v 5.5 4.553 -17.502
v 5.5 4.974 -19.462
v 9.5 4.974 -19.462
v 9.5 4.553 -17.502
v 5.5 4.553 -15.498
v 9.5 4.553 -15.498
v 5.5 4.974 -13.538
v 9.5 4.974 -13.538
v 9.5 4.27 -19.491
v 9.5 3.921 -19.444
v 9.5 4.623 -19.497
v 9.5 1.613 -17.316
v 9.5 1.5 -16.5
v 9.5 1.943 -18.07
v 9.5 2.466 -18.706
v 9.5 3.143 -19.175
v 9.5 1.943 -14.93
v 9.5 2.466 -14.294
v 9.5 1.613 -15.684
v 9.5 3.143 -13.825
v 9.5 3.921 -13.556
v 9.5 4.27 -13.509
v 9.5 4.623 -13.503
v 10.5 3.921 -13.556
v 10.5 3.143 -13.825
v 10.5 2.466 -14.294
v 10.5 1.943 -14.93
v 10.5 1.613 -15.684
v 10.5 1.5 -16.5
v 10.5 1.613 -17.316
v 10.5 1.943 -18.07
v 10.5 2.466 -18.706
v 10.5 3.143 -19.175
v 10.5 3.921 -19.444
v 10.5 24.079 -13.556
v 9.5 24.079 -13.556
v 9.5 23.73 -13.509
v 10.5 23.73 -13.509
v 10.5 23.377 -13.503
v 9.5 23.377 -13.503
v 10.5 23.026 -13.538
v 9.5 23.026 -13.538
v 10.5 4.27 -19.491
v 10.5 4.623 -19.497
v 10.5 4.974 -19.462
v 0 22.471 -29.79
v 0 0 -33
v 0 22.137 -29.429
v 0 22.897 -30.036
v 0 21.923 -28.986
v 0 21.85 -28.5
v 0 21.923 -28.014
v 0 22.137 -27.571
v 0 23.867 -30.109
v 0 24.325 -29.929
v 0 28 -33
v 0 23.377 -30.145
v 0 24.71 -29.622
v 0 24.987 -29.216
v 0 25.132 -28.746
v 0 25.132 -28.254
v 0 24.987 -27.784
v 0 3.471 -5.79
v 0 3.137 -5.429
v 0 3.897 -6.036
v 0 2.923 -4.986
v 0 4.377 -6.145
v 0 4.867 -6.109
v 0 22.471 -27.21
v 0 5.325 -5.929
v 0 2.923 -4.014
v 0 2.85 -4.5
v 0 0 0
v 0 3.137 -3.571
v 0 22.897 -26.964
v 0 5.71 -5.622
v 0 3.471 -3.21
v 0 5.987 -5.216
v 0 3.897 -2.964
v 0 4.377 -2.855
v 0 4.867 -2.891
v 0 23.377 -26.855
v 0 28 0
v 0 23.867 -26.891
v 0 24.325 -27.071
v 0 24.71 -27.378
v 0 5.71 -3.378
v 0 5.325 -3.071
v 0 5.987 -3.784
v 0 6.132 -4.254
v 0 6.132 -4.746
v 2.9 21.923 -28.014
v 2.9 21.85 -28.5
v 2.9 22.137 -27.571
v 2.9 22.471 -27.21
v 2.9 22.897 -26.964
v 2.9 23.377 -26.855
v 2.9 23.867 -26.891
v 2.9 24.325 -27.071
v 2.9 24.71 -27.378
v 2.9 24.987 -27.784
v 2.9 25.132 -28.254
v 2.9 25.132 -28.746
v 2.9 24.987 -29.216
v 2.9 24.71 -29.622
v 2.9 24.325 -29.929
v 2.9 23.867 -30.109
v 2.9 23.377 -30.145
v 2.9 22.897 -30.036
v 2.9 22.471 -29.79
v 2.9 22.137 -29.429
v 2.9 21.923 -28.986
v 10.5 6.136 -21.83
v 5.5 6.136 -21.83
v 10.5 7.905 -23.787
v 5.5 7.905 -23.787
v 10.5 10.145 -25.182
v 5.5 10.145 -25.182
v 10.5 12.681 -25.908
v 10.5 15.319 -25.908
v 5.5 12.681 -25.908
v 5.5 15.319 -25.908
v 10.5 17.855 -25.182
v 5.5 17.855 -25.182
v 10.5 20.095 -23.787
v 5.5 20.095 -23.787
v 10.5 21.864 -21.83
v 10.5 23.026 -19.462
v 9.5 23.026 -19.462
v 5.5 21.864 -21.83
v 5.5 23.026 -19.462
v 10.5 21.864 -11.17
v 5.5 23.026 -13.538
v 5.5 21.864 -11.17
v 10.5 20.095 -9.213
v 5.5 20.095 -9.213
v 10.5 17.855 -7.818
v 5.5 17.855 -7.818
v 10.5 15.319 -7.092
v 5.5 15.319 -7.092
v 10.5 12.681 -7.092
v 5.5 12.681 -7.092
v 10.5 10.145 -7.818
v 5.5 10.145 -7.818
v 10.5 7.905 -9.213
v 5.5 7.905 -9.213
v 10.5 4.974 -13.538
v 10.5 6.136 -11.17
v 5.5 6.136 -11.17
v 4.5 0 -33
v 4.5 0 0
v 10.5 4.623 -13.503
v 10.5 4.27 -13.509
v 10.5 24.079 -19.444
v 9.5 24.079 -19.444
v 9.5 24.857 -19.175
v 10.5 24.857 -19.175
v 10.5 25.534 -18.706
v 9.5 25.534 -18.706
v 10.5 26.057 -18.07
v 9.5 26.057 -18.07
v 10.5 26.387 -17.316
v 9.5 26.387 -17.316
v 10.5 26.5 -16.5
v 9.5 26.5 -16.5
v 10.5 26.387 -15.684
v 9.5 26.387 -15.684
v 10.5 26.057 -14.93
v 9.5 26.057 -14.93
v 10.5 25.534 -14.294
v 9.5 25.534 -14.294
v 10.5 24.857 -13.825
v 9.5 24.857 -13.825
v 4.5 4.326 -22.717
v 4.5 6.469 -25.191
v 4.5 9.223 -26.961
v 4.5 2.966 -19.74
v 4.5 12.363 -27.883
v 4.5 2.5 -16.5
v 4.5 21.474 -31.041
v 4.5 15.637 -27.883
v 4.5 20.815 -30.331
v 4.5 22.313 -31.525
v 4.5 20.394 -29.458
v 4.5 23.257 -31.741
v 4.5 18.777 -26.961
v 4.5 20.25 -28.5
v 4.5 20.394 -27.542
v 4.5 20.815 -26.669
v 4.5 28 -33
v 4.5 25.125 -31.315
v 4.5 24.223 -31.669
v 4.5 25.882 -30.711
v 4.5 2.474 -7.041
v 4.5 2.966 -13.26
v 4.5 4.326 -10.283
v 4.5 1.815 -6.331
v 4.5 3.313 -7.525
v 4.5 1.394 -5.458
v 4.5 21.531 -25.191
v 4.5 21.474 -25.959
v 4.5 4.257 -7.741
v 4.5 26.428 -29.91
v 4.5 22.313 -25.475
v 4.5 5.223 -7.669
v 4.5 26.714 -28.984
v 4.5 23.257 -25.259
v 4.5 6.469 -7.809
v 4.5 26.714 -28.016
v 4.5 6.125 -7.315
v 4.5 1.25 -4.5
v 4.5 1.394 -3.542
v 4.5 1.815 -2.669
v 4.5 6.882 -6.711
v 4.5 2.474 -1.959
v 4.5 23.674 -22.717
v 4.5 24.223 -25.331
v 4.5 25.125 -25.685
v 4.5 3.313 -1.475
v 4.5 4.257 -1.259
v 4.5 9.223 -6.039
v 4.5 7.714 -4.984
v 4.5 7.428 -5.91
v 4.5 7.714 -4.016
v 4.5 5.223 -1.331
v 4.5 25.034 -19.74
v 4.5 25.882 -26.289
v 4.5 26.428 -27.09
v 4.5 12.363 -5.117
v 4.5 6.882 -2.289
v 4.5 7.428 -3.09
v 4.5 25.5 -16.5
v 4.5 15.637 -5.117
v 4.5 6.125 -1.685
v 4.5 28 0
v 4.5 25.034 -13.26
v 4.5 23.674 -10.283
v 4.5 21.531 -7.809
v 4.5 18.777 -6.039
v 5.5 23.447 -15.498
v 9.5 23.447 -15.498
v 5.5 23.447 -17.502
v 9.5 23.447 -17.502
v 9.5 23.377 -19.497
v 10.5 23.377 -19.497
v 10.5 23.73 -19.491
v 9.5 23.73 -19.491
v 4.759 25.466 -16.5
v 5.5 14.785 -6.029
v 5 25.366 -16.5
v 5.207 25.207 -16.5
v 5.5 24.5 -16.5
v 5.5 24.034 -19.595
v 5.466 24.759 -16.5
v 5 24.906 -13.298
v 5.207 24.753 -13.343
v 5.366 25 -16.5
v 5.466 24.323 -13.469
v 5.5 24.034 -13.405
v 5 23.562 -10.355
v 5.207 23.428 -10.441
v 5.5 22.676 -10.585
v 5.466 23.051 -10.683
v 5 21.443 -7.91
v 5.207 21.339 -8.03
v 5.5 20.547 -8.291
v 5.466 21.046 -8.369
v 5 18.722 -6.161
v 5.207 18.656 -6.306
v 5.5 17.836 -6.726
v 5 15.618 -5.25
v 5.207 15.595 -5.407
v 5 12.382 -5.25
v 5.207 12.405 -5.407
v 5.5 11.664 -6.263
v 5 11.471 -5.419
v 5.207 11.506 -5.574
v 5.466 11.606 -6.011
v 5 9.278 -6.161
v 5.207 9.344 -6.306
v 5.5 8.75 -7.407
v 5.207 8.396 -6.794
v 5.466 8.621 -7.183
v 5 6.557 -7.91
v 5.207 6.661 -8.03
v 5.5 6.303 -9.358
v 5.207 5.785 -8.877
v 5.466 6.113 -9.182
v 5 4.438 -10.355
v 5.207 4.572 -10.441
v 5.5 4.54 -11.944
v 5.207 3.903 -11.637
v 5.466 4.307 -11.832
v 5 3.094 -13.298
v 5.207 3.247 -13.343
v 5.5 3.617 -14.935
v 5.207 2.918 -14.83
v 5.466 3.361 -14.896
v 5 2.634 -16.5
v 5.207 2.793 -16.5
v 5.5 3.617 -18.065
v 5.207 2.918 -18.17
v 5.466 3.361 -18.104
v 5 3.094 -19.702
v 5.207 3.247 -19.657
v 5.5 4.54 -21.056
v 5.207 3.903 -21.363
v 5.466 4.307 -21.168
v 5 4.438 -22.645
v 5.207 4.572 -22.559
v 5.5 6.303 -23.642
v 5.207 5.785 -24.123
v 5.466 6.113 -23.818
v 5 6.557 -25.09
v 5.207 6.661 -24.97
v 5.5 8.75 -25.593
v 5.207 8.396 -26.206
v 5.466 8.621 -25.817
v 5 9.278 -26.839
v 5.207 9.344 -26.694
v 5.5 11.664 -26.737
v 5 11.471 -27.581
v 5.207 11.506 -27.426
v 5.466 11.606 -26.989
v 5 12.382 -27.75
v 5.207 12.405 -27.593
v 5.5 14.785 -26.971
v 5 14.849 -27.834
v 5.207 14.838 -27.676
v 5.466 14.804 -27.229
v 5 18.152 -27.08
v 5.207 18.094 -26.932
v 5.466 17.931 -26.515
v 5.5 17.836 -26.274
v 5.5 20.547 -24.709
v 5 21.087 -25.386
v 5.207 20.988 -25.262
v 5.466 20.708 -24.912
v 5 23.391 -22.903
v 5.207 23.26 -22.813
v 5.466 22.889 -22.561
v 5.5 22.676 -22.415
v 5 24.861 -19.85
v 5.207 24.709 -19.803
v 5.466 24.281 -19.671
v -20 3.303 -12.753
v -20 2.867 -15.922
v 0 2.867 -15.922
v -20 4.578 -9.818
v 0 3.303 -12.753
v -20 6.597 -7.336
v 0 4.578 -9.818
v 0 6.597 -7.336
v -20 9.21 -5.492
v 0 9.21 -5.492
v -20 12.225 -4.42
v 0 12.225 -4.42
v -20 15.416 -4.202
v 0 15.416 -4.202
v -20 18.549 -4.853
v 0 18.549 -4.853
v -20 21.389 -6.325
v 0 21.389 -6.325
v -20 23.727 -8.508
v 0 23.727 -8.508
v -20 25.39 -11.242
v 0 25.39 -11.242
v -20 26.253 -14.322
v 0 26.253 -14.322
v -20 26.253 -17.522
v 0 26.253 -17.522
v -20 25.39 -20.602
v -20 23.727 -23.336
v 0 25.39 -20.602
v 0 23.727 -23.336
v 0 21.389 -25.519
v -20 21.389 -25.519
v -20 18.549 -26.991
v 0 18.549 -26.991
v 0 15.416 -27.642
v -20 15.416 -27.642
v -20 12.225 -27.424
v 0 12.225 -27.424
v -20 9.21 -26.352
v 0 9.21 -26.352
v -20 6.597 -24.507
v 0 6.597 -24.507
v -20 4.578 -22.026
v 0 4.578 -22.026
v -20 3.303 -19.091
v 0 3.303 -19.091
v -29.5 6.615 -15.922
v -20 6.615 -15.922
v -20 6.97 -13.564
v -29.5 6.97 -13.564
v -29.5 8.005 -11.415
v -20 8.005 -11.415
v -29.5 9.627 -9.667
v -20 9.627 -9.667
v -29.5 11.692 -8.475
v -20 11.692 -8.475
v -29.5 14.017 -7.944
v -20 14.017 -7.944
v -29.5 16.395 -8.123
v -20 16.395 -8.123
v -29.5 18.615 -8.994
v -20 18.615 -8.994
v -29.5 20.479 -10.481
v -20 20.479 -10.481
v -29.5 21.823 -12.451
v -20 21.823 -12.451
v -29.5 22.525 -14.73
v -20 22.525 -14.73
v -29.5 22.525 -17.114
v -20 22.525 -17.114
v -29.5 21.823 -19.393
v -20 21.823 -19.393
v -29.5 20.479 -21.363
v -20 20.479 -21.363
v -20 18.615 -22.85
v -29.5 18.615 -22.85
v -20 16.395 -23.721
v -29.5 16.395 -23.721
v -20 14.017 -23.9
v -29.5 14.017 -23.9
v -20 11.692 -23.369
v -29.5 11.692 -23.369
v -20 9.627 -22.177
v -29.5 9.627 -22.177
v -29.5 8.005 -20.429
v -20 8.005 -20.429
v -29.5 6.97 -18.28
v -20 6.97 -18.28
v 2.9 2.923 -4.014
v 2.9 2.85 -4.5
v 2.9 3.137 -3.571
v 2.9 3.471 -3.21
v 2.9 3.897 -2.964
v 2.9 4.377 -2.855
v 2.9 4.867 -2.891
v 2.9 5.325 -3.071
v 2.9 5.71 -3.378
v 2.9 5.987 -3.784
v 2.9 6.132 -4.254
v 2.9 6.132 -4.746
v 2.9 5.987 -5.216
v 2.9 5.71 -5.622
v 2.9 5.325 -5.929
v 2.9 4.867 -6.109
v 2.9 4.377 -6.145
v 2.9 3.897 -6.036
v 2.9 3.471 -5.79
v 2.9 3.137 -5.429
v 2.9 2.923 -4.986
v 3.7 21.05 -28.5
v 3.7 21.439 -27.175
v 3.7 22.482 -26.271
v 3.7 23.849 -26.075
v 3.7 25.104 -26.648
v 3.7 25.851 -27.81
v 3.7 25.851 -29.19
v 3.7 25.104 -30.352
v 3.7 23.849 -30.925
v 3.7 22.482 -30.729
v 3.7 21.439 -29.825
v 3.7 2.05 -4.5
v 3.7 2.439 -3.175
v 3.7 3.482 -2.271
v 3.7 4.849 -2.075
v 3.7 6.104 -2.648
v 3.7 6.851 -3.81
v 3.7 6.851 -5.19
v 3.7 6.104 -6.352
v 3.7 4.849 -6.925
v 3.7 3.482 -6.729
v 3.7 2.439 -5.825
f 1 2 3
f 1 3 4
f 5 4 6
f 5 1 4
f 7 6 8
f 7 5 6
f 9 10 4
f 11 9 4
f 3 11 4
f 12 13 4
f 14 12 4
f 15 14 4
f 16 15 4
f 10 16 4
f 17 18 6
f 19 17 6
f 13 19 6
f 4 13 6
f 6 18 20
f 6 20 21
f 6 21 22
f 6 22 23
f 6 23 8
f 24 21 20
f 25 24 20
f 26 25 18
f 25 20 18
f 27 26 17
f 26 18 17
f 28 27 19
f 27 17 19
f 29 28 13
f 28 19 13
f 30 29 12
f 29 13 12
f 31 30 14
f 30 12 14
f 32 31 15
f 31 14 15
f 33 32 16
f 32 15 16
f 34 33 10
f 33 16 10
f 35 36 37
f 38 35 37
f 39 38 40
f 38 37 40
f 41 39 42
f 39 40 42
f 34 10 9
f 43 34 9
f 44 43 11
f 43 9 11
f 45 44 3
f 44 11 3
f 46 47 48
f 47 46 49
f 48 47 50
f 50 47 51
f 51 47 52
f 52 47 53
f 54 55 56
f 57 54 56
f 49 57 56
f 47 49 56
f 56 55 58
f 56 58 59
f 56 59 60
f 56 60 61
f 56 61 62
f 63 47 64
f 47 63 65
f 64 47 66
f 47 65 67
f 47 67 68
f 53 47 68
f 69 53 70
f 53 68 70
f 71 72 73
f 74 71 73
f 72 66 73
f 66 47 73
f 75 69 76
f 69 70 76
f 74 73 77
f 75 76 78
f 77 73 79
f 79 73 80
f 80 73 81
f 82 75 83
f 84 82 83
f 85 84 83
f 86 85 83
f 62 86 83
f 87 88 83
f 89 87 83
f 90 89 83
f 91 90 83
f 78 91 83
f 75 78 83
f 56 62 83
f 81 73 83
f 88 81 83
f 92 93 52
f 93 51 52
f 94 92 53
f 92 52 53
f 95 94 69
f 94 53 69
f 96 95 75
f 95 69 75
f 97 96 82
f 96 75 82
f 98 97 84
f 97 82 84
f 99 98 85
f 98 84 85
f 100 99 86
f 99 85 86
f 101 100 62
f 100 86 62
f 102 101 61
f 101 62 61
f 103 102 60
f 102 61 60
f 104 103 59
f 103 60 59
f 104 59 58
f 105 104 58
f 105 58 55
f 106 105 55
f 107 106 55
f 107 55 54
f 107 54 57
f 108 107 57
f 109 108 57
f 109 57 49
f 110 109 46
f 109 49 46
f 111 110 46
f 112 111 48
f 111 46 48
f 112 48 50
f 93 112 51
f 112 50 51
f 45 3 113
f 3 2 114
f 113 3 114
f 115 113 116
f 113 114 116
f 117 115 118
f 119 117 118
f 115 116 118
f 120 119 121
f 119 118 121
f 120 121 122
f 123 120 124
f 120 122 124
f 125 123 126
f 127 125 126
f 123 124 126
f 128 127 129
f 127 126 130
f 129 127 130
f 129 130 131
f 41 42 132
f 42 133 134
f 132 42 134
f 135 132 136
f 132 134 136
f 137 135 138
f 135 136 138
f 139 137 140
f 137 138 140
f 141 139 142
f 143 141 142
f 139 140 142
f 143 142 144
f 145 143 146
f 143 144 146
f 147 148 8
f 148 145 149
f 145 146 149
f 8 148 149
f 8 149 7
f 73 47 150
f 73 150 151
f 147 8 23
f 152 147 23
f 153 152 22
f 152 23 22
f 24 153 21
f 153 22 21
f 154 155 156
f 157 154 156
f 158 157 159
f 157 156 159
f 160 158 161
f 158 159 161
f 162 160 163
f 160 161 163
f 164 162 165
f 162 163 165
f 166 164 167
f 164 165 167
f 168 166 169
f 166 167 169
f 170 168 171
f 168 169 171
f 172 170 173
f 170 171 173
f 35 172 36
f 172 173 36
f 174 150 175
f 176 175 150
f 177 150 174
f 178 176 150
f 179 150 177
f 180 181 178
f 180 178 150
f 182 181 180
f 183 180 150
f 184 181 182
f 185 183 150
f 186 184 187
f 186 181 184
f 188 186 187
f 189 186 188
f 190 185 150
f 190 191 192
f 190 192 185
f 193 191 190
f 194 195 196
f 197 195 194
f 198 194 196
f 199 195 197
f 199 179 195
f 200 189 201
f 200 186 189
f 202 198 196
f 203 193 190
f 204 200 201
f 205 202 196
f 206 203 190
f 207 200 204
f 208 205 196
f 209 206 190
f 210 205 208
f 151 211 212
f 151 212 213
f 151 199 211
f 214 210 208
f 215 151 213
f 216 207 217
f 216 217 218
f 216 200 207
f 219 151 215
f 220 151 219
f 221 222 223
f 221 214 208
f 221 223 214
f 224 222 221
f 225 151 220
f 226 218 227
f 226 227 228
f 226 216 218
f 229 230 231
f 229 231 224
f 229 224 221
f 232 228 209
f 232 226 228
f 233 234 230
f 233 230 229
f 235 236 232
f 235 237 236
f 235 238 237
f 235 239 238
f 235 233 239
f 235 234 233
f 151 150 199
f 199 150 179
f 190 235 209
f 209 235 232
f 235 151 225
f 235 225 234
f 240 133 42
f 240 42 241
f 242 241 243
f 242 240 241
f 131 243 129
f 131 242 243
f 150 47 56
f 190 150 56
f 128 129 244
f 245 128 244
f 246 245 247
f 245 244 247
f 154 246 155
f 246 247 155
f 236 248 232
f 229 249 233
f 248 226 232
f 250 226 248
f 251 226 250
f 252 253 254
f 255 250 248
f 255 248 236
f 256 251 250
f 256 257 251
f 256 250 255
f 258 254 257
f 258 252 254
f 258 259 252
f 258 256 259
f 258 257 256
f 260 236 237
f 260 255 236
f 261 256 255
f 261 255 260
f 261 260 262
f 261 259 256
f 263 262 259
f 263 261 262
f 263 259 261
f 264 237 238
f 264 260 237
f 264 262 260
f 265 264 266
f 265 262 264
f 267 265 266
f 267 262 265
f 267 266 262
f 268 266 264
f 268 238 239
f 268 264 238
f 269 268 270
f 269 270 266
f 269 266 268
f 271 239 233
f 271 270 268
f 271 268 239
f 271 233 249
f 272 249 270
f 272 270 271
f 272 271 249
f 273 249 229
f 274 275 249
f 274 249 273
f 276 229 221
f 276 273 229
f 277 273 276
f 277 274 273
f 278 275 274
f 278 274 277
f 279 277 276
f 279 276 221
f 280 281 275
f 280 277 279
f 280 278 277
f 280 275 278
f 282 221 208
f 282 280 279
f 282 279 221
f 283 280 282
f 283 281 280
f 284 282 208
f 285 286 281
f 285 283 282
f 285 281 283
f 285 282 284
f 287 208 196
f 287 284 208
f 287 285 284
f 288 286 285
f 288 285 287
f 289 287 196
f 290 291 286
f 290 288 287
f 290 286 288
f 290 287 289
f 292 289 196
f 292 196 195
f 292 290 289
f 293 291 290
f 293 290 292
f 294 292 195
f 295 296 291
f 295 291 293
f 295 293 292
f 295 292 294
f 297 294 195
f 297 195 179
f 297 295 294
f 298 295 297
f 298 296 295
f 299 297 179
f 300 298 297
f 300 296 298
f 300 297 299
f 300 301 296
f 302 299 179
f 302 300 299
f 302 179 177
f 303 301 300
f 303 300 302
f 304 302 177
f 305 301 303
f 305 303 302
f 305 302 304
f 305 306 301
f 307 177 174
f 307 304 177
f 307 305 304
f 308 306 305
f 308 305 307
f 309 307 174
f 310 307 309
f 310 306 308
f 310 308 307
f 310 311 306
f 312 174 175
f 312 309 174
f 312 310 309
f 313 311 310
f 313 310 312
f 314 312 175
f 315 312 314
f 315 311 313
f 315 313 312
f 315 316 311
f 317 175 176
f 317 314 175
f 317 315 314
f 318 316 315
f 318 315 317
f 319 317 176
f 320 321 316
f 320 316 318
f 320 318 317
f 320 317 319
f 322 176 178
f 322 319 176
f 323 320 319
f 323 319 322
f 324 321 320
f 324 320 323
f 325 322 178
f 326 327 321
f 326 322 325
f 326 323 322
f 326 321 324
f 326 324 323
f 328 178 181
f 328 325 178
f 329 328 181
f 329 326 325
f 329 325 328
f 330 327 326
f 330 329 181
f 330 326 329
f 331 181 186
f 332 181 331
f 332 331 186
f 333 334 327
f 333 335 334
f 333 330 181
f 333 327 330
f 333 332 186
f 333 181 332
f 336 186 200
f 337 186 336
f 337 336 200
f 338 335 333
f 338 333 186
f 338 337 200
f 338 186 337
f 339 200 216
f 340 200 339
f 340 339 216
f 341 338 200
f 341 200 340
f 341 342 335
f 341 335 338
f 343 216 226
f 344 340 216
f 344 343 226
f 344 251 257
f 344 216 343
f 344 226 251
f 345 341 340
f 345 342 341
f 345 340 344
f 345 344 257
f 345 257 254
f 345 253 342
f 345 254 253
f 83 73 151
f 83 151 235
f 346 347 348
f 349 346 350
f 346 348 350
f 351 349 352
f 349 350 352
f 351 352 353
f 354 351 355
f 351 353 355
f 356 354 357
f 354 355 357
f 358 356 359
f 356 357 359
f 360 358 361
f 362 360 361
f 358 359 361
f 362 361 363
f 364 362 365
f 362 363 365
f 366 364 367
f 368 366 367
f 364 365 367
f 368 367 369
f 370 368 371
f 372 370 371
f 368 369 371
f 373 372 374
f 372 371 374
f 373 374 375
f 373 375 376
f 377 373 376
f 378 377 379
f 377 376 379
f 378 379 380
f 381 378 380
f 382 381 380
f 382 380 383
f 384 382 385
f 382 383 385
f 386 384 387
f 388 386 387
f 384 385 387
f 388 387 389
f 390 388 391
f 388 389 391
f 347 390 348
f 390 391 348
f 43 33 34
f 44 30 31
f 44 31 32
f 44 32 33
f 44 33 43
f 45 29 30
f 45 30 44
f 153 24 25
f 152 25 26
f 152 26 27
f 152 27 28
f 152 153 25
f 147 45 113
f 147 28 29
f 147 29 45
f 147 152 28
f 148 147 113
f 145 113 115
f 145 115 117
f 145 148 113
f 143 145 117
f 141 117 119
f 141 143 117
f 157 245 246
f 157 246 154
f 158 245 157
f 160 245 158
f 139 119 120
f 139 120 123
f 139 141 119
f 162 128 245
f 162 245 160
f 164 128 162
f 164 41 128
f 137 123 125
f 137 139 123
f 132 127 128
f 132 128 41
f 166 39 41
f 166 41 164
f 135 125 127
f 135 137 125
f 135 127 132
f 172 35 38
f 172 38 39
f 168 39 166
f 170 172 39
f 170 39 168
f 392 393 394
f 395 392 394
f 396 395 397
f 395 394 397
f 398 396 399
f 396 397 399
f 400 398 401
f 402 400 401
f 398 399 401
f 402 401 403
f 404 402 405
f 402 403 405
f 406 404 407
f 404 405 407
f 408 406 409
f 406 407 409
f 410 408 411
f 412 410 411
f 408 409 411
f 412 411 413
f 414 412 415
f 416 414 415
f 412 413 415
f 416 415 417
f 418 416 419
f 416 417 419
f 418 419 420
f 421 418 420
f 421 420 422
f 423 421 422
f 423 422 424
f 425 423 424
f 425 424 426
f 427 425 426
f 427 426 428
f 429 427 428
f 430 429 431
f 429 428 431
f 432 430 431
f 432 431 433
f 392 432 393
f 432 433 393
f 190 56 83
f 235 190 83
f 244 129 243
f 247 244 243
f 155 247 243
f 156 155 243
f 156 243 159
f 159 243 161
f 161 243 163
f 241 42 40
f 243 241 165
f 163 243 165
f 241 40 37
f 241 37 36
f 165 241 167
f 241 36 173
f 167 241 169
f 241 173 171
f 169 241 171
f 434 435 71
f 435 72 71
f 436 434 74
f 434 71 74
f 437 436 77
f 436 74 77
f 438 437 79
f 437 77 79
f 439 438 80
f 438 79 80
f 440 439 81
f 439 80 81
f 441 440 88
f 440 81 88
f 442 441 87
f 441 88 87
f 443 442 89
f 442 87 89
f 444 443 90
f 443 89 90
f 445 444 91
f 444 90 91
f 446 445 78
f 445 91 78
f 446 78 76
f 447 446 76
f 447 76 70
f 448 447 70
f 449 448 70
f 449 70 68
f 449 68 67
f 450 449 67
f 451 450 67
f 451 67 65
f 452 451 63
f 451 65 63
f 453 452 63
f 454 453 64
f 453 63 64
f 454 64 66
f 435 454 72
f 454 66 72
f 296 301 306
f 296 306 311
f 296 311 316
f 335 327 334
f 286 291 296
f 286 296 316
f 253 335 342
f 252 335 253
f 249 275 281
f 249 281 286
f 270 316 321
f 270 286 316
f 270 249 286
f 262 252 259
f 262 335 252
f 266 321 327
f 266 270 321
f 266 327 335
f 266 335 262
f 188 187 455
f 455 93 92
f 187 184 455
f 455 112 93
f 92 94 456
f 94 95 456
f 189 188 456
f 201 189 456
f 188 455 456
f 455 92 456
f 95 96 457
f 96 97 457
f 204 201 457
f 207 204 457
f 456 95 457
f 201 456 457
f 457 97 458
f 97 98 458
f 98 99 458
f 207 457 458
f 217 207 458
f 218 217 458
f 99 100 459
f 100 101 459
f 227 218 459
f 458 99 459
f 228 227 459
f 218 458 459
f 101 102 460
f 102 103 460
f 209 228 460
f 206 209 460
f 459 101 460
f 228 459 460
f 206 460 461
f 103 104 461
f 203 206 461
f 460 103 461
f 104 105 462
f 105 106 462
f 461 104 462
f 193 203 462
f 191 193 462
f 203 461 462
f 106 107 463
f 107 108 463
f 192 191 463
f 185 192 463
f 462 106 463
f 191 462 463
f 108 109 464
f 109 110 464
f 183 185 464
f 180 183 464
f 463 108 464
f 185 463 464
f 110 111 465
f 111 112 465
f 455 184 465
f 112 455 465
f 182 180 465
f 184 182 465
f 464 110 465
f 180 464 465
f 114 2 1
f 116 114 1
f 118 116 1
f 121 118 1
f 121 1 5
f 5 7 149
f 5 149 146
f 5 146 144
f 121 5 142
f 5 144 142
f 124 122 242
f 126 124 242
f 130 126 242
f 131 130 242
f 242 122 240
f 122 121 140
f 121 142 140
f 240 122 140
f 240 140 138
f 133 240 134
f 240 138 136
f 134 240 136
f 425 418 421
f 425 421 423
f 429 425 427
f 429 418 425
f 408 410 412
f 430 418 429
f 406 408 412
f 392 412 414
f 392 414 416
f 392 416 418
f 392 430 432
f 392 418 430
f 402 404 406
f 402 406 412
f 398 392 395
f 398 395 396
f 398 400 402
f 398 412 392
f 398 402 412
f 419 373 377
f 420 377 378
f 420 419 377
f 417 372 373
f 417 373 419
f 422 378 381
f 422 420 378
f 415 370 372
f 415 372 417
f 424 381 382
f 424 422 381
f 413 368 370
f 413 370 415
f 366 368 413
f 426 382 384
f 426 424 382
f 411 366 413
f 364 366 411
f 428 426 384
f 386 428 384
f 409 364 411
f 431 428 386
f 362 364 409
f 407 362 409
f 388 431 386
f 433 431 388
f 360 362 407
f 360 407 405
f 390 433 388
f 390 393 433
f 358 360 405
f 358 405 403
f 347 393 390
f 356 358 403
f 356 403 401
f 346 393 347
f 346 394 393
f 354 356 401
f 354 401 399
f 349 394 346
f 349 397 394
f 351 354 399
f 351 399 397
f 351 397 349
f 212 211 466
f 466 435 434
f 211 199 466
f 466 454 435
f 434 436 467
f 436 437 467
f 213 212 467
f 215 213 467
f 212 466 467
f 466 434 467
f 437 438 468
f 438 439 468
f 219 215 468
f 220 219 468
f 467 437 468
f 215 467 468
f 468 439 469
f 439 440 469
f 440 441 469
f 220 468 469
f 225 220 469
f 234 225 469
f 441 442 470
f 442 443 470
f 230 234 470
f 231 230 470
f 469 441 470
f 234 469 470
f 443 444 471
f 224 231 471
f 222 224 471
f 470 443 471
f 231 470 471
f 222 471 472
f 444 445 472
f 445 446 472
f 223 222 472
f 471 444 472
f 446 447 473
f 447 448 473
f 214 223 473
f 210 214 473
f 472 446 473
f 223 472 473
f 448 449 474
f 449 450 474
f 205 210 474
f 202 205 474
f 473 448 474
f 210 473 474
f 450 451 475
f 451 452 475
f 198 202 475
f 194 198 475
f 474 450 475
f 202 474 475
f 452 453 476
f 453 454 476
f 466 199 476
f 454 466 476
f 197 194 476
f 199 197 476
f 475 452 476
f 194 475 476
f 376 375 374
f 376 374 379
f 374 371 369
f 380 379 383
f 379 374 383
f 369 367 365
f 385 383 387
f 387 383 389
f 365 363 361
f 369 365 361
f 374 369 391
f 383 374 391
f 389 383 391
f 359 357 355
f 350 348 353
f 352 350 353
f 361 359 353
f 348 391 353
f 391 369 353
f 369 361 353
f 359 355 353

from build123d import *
from build123d import SkipClean  # not in build123d's __all__

# Parameters (mm, degrees)
F0_W            = 28
F0_H            = 33
F1_DEPTH        = 4.5
F2_R            = 11.7475
F3_DEPTH        = 20
F4_R            = 8
F5_DEPTH        = 9.5
F6_R            = 11.5
F7_DEPTH        = 1
F8_R            = 0.99999
F10_DEPTH       = 5
F11_DEPTH       = 4
F13_D           = 3.3
F13_CSINK_D     = 6.5
F13_CSINK_ANGLE = 90
F14_D           = 3.3
F14_CSINK_D     = 6.5
F14_CSINK_ANGLE = 90


# Not quite as in the source:
# - a fillet or chamfer is up to 0.001 mm smaller than in the source, because OpenCascade refuses the exact size


with BuildPart() as f1:
    # F0 (on Right) → F1 (new body)
    with BuildSketch(Plane.YZ):
        with Locations((14, -16.5)):
            Rectangle(F0_W, F0_H)
    extrude(amount=F1_DEPTH)

    # F6 (on face) → F7 (join)
    with BuildSketch(Plane.YZ.offset(4.5)):
        with Locations((14, -16.5)):
            Circle(F6_R)
    extrude(amount=F7_DEPTH)

    # F8 (radius 1 in the source; OpenCascade refuses exactly that, so slightly less here)
    f8_edges = [f1.edges().sort_by_distance(p)[0] for p in [
        (5.5, 2.5, -16.5),
    ]]
    fillet(f8_edges, radius=F8_R)

    # F13 (through all)
    with Locations(Plane.YZ.offset(4.5)):
        with Locations((4.5, -4.5)):
            CounterSinkHole(F13_D / 2, F13_CSINK_D / 2, counter_sink_angle=F13_CSINK_ANGLE)

    # F14 (through all)
    with Locations(Plane.YZ.offset(4.5)):
        with Locations((23.5, -28.5)):
            CounterSinkHole(F14_D / 2, F14_CSINK_D / 2, counter_sink_angle=F14_CSINK_ANGLE)


with BuildPart() as f3:
    # F2 (on face) → F3 (new body)
    with BuildSketch(Plane(origin=(0, 0, 0), x_dir=(0, -1, 0), z_dir=(-1, 0, 0))):
        with Locations((-14.6148139611, -15.9219913185)):
            Circle(F2_R)
    extrude(amount=F3_DEPTH)

    # F4 (on face) → F5 (join)
    with BuildSketch(Plane(origin=(-20, 0, 0), x_dir=(0, -1, 0), z_dir=(-1, 0, 0))):
        with Locations((-14.6148139611, -15.9219913185)):
            Circle(F4_R)
    extrude(amount=F5_DEPTH)


with BuildPart() as f10:
    # F9 (on face) → F10 (new body)
    with BuildSketch(Plane.YZ.offset(5.5)):
        with BuildLine():
            ThreePointArc((4.9736842105, -13.5376321517), (4.5, -16.5), (4.9736842105, -19.4623678483))
            ThreePointArc((4.9736842105, -19.4623678483), (14, -26), (23.0263157895, -19.4623678483))
            ThreePointArc((23.0263157895, -19.4623678483), (23.5, -16.5), (23.0263157895, -13.5376321517))
            ThreePointArc((23.0263157895, -13.5376321517), (14, -7), (4.9736842105, -13.5376321517))
        make_face()
        with BuildLine():
            ThreePointArc((3.9210415789, -13.5563955519), (1.5, -16.5), (3.9210415789, -19.4436044481))
            ThreePointArc((3.9210415789, -19.4436044481), (3.49999, -16.5), (3.9210415789, -13.5563955519))
        make_face()
        with BuildLine():
            ThreePointArc((24.50001, -16.5), (24.3942141168, -17.9867827329), (24.0789584211, -19.4436044481))
            ThreePointArc((24.0789584211, -19.4436044481), (26.5, -16.5), (24.0789584211, -13.5563955519))
            ThreePointArc((24.0789584211, -13.5563955519), (24.3942141168, -15.0132172671), (24.50001, -16.5))
        make_face()
        with BuildLine():
            ThreePointArc((3.9210415789, -19.4436044481), (4.4465333642, -19.4995235153), (4.9736842105, -19.4623678483))
            ThreePointArc((4.9736842105, -19.4623678483), (4.5, -16.5), (4.9736842105, -13.5376321517))
            ThreePointArc((4.9736842105, -13.5376321517), (4.4465333642, -13.5004764847), (3.9210415789, -13.5563955519))
            ThreePointArc((3.9210415789, -13.5563955519), (3.49999, -16.5), (3.9210415789, -19.4436044481))
        make_face()
        with BuildLine():
            ThreePointArc((23.0263157895, -13.5376321517), (23.5, -16.5), (23.0263157895, -19.4623678483))
            ThreePointArc((23.0263157895, -19.4623678483), (23.5534666358, -19.4995235153), (24.0789584211, -19.4436044481))
            ThreePointArc((24.0789584211, -19.4436044481), (24.3942141168, -17.9867827329), (24.50001, -16.5))
            ThreePointArc((24.50001, -16.5), (24.3942141168, -15.0132172671), (24.0789584211, -13.5563955519))
            ThreePointArc((24.0789584211, -13.5563955519), (23.5534666358, -13.5004764847), (23.0263157895, -13.5376321517))
        make_face()
    extrude(amount=F10_DEPTH)

    # F9 (on face) → F11 (cut)
    with BuildSketch(Plane.YZ.offset(5.5)):
        with BuildLine():
            ThreePointArc((3.9210415789, -19.4436044481), (4.4465333642, -19.4995235153), (4.9736842105, -19.4623678483))
            ThreePointArc((4.9736842105, -19.4623678483), (4.5, -16.5), (4.9736842105, -13.5376321517))
            ThreePointArc((4.9736842105, -13.5376321517), (4.4465333642, -13.5004764847), (3.9210415789, -13.5563955519))
            ThreePointArc((3.9210415789, -13.5563955519), (3.49999, -16.5), (3.9210415789, -19.4436044481))
        make_face()
        with BuildLine():
            ThreePointArc((3.9210415789, -13.5563955519), (1.5, -16.5), (3.9210415789, -19.4436044481))
            ThreePointArc((3.9210415789, -19.4436044481), (3.49999, -16.5), (3.9210415789, -13.5563955519))
        make_face()
        with BuildLine():
            ThreePointArc((23.0263157895, -13.5376321517), (23.5, -16.5), (23.0263157895, -19.4623678483))
            ThreePointArc((23.0263157895, -19.4623678483), (23.5534666358, -19.4995235153), (24.0789584211, -19.4436044481))
            ThreePointArc((24.0789584211, -19.4436044481), (24.3942141168, -17.9867827329), (24.50001, -16.5))
            ThreePointArc((24.50001, -16.5), (24.3942141168, -15.0132172671), (24.0789584211, -13.5563955519))
            ThreePointArc((24.0789584211, -13.5563955519), (23.5534666358, -13.5004764847), (23.0263157895, -13.5376321517))
        make_face()
        with BuildLine():
            ThreePointArc((24.50001, -16.5), (24.3942141168, -17.9867827329), (24.0789584211, -19.4436044481))
            ThreePointArc((24.0789584211, -19.4436044481), (26.5, -16.5), (24.0789584211, -13.5563955519))
            ThreePointArc((24.0789584211, -13.5563955519), (24.3942141168, -15.0132172671), (24.50001, -16.5))
        make_face()
    with SkipClean():  # cleaning this boolean's faces spoils the solid; the shape is the same uncleaned
        extrude(amount=F11_DEPTH, mode=Mode.SUBTRACT)


solid = Compound([f1.part, f3.part, f10.part])
